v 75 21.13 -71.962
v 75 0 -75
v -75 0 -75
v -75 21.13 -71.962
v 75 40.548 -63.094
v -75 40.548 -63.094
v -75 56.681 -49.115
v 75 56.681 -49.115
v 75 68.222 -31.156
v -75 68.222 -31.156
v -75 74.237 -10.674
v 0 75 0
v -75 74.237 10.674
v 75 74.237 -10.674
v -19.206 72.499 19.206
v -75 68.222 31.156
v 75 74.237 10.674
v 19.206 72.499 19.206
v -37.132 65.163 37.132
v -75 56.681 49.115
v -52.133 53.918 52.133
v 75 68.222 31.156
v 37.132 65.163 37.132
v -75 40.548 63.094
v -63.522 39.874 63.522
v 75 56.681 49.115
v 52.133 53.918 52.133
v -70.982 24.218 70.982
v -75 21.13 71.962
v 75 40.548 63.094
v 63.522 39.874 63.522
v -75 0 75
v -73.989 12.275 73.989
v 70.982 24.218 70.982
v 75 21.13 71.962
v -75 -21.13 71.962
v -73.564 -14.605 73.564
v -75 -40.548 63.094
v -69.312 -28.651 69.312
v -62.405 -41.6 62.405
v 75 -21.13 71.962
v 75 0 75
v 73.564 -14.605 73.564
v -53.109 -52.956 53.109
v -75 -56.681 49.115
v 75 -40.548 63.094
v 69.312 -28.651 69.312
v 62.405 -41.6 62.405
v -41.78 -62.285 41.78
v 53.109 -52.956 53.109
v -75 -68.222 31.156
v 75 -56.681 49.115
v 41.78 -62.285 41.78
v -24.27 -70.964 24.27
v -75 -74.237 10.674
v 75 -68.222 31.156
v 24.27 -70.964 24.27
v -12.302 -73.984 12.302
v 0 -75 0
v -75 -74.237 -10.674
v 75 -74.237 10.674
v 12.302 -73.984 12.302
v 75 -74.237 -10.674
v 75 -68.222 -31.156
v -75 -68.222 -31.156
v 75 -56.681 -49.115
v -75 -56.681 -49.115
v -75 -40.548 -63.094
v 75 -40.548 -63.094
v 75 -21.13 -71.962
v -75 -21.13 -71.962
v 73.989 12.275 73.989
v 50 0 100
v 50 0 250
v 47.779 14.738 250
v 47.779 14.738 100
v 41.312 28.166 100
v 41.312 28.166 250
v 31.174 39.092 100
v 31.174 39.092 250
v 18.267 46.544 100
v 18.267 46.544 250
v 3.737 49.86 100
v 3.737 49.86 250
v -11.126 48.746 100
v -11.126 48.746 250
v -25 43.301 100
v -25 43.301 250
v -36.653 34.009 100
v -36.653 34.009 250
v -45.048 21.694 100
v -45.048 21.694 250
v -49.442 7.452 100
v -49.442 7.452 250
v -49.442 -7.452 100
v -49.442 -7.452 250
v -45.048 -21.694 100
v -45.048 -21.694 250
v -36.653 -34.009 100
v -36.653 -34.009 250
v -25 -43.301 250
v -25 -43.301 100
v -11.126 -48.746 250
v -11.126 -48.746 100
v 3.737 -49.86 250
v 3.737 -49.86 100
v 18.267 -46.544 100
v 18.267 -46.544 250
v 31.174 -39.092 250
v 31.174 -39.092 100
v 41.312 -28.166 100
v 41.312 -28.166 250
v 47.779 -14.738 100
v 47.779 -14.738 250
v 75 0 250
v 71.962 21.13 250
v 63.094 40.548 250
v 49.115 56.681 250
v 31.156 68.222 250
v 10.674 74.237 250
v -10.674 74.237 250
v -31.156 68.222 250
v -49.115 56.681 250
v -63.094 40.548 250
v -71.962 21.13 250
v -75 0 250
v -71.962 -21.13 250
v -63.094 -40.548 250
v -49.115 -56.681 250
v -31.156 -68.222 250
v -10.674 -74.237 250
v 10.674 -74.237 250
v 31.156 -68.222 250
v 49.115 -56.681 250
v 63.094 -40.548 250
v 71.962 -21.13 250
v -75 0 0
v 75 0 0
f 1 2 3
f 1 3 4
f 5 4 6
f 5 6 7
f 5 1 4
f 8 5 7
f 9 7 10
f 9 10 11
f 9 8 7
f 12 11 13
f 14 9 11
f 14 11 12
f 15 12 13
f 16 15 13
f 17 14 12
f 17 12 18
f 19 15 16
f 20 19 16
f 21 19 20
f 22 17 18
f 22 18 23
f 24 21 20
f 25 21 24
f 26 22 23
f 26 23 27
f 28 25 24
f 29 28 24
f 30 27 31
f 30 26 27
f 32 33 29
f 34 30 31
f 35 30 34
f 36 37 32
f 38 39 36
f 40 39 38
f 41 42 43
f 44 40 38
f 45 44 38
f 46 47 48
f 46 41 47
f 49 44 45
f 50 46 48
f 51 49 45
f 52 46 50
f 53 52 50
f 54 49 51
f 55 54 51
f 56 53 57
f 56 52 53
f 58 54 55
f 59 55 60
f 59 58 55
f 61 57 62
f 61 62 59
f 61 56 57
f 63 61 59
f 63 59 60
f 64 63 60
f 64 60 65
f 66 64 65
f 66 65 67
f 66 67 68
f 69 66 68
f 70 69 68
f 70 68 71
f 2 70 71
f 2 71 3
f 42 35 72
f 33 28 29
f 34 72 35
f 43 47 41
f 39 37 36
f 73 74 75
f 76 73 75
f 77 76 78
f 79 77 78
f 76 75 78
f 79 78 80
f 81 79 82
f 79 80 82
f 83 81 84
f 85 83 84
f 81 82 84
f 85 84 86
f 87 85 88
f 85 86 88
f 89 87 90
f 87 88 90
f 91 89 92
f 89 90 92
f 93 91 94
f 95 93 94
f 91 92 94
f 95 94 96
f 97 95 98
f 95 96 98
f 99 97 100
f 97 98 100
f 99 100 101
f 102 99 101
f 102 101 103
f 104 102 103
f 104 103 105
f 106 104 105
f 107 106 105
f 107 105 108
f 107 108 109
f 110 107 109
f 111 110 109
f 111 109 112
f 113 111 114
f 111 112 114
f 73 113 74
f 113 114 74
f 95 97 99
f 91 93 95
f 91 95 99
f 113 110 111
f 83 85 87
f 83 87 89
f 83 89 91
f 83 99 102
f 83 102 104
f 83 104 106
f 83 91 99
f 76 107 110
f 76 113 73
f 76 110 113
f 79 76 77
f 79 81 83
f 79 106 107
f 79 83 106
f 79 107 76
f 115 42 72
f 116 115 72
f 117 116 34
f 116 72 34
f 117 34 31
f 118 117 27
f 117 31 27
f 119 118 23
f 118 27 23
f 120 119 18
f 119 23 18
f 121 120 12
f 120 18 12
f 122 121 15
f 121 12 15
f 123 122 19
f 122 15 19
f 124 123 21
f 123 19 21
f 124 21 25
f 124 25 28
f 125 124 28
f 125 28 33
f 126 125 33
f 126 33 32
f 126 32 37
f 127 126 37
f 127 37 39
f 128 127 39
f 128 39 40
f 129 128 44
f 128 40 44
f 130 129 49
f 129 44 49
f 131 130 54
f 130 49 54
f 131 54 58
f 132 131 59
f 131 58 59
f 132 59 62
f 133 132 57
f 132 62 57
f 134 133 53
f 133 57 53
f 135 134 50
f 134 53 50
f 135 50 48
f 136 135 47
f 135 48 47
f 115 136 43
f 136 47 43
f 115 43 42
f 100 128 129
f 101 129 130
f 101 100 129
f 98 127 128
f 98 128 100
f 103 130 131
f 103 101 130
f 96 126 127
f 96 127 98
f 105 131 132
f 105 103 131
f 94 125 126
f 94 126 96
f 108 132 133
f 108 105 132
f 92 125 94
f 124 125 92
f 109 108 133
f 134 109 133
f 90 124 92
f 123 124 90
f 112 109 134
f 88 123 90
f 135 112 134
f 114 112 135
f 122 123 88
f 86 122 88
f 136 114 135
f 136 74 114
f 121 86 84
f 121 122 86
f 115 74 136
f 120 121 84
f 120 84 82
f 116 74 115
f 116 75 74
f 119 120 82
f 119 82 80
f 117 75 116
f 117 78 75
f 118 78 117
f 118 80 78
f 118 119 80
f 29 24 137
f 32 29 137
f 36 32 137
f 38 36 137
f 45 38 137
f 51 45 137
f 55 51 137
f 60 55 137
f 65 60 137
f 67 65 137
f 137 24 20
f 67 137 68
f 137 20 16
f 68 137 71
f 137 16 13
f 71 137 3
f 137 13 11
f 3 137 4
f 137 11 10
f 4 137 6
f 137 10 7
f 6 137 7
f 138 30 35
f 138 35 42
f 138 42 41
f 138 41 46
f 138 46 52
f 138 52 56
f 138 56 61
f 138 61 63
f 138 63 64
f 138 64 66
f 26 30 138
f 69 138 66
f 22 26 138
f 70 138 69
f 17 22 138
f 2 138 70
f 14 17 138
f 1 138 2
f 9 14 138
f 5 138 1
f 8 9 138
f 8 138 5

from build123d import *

# Parameters (mm, degrees)
SKETCH1_R           = 75
BOSS_EXTRUDE1_DEPTH = 75
SKETCH2_R           = 75
BOSS_EXTRUDE2_DEPTH = 250
SKETCH3_R           = 50
CUT_EXTRUDE1_DEPTH  = 150


with BuildPart() as part:
    # Sketch1 → Boss-Extrude1 (new body, symmetric)
    with BuildSketch(Plane(origin=(0, 0, 0), x_dir=(0, 0, -1), z_dir=(1, 0, 0))):
        Circle(SKETCH1_R)
    extrude(amount=BOSS_EXTRUDE1_DEPTH, both=True)

    # Sketch2 → Boss-Extrude2 (add)
    with BuildSketch(Plane.XY):
        Circle(SKETCH2_R)
    extrude(amount=BOSS_EXTRUDE2_DEPTH)

    # Sketch3 → Cut-Extrude1 (cut)
    with BuildSketch(Plane.XY.offset(250)):
        Circle(SKETCH3_R)
    extrude(amount=-CUT_EXTRUDE1_DEPTH, mode=Mode.SUBTRACT)


solid = part.part
